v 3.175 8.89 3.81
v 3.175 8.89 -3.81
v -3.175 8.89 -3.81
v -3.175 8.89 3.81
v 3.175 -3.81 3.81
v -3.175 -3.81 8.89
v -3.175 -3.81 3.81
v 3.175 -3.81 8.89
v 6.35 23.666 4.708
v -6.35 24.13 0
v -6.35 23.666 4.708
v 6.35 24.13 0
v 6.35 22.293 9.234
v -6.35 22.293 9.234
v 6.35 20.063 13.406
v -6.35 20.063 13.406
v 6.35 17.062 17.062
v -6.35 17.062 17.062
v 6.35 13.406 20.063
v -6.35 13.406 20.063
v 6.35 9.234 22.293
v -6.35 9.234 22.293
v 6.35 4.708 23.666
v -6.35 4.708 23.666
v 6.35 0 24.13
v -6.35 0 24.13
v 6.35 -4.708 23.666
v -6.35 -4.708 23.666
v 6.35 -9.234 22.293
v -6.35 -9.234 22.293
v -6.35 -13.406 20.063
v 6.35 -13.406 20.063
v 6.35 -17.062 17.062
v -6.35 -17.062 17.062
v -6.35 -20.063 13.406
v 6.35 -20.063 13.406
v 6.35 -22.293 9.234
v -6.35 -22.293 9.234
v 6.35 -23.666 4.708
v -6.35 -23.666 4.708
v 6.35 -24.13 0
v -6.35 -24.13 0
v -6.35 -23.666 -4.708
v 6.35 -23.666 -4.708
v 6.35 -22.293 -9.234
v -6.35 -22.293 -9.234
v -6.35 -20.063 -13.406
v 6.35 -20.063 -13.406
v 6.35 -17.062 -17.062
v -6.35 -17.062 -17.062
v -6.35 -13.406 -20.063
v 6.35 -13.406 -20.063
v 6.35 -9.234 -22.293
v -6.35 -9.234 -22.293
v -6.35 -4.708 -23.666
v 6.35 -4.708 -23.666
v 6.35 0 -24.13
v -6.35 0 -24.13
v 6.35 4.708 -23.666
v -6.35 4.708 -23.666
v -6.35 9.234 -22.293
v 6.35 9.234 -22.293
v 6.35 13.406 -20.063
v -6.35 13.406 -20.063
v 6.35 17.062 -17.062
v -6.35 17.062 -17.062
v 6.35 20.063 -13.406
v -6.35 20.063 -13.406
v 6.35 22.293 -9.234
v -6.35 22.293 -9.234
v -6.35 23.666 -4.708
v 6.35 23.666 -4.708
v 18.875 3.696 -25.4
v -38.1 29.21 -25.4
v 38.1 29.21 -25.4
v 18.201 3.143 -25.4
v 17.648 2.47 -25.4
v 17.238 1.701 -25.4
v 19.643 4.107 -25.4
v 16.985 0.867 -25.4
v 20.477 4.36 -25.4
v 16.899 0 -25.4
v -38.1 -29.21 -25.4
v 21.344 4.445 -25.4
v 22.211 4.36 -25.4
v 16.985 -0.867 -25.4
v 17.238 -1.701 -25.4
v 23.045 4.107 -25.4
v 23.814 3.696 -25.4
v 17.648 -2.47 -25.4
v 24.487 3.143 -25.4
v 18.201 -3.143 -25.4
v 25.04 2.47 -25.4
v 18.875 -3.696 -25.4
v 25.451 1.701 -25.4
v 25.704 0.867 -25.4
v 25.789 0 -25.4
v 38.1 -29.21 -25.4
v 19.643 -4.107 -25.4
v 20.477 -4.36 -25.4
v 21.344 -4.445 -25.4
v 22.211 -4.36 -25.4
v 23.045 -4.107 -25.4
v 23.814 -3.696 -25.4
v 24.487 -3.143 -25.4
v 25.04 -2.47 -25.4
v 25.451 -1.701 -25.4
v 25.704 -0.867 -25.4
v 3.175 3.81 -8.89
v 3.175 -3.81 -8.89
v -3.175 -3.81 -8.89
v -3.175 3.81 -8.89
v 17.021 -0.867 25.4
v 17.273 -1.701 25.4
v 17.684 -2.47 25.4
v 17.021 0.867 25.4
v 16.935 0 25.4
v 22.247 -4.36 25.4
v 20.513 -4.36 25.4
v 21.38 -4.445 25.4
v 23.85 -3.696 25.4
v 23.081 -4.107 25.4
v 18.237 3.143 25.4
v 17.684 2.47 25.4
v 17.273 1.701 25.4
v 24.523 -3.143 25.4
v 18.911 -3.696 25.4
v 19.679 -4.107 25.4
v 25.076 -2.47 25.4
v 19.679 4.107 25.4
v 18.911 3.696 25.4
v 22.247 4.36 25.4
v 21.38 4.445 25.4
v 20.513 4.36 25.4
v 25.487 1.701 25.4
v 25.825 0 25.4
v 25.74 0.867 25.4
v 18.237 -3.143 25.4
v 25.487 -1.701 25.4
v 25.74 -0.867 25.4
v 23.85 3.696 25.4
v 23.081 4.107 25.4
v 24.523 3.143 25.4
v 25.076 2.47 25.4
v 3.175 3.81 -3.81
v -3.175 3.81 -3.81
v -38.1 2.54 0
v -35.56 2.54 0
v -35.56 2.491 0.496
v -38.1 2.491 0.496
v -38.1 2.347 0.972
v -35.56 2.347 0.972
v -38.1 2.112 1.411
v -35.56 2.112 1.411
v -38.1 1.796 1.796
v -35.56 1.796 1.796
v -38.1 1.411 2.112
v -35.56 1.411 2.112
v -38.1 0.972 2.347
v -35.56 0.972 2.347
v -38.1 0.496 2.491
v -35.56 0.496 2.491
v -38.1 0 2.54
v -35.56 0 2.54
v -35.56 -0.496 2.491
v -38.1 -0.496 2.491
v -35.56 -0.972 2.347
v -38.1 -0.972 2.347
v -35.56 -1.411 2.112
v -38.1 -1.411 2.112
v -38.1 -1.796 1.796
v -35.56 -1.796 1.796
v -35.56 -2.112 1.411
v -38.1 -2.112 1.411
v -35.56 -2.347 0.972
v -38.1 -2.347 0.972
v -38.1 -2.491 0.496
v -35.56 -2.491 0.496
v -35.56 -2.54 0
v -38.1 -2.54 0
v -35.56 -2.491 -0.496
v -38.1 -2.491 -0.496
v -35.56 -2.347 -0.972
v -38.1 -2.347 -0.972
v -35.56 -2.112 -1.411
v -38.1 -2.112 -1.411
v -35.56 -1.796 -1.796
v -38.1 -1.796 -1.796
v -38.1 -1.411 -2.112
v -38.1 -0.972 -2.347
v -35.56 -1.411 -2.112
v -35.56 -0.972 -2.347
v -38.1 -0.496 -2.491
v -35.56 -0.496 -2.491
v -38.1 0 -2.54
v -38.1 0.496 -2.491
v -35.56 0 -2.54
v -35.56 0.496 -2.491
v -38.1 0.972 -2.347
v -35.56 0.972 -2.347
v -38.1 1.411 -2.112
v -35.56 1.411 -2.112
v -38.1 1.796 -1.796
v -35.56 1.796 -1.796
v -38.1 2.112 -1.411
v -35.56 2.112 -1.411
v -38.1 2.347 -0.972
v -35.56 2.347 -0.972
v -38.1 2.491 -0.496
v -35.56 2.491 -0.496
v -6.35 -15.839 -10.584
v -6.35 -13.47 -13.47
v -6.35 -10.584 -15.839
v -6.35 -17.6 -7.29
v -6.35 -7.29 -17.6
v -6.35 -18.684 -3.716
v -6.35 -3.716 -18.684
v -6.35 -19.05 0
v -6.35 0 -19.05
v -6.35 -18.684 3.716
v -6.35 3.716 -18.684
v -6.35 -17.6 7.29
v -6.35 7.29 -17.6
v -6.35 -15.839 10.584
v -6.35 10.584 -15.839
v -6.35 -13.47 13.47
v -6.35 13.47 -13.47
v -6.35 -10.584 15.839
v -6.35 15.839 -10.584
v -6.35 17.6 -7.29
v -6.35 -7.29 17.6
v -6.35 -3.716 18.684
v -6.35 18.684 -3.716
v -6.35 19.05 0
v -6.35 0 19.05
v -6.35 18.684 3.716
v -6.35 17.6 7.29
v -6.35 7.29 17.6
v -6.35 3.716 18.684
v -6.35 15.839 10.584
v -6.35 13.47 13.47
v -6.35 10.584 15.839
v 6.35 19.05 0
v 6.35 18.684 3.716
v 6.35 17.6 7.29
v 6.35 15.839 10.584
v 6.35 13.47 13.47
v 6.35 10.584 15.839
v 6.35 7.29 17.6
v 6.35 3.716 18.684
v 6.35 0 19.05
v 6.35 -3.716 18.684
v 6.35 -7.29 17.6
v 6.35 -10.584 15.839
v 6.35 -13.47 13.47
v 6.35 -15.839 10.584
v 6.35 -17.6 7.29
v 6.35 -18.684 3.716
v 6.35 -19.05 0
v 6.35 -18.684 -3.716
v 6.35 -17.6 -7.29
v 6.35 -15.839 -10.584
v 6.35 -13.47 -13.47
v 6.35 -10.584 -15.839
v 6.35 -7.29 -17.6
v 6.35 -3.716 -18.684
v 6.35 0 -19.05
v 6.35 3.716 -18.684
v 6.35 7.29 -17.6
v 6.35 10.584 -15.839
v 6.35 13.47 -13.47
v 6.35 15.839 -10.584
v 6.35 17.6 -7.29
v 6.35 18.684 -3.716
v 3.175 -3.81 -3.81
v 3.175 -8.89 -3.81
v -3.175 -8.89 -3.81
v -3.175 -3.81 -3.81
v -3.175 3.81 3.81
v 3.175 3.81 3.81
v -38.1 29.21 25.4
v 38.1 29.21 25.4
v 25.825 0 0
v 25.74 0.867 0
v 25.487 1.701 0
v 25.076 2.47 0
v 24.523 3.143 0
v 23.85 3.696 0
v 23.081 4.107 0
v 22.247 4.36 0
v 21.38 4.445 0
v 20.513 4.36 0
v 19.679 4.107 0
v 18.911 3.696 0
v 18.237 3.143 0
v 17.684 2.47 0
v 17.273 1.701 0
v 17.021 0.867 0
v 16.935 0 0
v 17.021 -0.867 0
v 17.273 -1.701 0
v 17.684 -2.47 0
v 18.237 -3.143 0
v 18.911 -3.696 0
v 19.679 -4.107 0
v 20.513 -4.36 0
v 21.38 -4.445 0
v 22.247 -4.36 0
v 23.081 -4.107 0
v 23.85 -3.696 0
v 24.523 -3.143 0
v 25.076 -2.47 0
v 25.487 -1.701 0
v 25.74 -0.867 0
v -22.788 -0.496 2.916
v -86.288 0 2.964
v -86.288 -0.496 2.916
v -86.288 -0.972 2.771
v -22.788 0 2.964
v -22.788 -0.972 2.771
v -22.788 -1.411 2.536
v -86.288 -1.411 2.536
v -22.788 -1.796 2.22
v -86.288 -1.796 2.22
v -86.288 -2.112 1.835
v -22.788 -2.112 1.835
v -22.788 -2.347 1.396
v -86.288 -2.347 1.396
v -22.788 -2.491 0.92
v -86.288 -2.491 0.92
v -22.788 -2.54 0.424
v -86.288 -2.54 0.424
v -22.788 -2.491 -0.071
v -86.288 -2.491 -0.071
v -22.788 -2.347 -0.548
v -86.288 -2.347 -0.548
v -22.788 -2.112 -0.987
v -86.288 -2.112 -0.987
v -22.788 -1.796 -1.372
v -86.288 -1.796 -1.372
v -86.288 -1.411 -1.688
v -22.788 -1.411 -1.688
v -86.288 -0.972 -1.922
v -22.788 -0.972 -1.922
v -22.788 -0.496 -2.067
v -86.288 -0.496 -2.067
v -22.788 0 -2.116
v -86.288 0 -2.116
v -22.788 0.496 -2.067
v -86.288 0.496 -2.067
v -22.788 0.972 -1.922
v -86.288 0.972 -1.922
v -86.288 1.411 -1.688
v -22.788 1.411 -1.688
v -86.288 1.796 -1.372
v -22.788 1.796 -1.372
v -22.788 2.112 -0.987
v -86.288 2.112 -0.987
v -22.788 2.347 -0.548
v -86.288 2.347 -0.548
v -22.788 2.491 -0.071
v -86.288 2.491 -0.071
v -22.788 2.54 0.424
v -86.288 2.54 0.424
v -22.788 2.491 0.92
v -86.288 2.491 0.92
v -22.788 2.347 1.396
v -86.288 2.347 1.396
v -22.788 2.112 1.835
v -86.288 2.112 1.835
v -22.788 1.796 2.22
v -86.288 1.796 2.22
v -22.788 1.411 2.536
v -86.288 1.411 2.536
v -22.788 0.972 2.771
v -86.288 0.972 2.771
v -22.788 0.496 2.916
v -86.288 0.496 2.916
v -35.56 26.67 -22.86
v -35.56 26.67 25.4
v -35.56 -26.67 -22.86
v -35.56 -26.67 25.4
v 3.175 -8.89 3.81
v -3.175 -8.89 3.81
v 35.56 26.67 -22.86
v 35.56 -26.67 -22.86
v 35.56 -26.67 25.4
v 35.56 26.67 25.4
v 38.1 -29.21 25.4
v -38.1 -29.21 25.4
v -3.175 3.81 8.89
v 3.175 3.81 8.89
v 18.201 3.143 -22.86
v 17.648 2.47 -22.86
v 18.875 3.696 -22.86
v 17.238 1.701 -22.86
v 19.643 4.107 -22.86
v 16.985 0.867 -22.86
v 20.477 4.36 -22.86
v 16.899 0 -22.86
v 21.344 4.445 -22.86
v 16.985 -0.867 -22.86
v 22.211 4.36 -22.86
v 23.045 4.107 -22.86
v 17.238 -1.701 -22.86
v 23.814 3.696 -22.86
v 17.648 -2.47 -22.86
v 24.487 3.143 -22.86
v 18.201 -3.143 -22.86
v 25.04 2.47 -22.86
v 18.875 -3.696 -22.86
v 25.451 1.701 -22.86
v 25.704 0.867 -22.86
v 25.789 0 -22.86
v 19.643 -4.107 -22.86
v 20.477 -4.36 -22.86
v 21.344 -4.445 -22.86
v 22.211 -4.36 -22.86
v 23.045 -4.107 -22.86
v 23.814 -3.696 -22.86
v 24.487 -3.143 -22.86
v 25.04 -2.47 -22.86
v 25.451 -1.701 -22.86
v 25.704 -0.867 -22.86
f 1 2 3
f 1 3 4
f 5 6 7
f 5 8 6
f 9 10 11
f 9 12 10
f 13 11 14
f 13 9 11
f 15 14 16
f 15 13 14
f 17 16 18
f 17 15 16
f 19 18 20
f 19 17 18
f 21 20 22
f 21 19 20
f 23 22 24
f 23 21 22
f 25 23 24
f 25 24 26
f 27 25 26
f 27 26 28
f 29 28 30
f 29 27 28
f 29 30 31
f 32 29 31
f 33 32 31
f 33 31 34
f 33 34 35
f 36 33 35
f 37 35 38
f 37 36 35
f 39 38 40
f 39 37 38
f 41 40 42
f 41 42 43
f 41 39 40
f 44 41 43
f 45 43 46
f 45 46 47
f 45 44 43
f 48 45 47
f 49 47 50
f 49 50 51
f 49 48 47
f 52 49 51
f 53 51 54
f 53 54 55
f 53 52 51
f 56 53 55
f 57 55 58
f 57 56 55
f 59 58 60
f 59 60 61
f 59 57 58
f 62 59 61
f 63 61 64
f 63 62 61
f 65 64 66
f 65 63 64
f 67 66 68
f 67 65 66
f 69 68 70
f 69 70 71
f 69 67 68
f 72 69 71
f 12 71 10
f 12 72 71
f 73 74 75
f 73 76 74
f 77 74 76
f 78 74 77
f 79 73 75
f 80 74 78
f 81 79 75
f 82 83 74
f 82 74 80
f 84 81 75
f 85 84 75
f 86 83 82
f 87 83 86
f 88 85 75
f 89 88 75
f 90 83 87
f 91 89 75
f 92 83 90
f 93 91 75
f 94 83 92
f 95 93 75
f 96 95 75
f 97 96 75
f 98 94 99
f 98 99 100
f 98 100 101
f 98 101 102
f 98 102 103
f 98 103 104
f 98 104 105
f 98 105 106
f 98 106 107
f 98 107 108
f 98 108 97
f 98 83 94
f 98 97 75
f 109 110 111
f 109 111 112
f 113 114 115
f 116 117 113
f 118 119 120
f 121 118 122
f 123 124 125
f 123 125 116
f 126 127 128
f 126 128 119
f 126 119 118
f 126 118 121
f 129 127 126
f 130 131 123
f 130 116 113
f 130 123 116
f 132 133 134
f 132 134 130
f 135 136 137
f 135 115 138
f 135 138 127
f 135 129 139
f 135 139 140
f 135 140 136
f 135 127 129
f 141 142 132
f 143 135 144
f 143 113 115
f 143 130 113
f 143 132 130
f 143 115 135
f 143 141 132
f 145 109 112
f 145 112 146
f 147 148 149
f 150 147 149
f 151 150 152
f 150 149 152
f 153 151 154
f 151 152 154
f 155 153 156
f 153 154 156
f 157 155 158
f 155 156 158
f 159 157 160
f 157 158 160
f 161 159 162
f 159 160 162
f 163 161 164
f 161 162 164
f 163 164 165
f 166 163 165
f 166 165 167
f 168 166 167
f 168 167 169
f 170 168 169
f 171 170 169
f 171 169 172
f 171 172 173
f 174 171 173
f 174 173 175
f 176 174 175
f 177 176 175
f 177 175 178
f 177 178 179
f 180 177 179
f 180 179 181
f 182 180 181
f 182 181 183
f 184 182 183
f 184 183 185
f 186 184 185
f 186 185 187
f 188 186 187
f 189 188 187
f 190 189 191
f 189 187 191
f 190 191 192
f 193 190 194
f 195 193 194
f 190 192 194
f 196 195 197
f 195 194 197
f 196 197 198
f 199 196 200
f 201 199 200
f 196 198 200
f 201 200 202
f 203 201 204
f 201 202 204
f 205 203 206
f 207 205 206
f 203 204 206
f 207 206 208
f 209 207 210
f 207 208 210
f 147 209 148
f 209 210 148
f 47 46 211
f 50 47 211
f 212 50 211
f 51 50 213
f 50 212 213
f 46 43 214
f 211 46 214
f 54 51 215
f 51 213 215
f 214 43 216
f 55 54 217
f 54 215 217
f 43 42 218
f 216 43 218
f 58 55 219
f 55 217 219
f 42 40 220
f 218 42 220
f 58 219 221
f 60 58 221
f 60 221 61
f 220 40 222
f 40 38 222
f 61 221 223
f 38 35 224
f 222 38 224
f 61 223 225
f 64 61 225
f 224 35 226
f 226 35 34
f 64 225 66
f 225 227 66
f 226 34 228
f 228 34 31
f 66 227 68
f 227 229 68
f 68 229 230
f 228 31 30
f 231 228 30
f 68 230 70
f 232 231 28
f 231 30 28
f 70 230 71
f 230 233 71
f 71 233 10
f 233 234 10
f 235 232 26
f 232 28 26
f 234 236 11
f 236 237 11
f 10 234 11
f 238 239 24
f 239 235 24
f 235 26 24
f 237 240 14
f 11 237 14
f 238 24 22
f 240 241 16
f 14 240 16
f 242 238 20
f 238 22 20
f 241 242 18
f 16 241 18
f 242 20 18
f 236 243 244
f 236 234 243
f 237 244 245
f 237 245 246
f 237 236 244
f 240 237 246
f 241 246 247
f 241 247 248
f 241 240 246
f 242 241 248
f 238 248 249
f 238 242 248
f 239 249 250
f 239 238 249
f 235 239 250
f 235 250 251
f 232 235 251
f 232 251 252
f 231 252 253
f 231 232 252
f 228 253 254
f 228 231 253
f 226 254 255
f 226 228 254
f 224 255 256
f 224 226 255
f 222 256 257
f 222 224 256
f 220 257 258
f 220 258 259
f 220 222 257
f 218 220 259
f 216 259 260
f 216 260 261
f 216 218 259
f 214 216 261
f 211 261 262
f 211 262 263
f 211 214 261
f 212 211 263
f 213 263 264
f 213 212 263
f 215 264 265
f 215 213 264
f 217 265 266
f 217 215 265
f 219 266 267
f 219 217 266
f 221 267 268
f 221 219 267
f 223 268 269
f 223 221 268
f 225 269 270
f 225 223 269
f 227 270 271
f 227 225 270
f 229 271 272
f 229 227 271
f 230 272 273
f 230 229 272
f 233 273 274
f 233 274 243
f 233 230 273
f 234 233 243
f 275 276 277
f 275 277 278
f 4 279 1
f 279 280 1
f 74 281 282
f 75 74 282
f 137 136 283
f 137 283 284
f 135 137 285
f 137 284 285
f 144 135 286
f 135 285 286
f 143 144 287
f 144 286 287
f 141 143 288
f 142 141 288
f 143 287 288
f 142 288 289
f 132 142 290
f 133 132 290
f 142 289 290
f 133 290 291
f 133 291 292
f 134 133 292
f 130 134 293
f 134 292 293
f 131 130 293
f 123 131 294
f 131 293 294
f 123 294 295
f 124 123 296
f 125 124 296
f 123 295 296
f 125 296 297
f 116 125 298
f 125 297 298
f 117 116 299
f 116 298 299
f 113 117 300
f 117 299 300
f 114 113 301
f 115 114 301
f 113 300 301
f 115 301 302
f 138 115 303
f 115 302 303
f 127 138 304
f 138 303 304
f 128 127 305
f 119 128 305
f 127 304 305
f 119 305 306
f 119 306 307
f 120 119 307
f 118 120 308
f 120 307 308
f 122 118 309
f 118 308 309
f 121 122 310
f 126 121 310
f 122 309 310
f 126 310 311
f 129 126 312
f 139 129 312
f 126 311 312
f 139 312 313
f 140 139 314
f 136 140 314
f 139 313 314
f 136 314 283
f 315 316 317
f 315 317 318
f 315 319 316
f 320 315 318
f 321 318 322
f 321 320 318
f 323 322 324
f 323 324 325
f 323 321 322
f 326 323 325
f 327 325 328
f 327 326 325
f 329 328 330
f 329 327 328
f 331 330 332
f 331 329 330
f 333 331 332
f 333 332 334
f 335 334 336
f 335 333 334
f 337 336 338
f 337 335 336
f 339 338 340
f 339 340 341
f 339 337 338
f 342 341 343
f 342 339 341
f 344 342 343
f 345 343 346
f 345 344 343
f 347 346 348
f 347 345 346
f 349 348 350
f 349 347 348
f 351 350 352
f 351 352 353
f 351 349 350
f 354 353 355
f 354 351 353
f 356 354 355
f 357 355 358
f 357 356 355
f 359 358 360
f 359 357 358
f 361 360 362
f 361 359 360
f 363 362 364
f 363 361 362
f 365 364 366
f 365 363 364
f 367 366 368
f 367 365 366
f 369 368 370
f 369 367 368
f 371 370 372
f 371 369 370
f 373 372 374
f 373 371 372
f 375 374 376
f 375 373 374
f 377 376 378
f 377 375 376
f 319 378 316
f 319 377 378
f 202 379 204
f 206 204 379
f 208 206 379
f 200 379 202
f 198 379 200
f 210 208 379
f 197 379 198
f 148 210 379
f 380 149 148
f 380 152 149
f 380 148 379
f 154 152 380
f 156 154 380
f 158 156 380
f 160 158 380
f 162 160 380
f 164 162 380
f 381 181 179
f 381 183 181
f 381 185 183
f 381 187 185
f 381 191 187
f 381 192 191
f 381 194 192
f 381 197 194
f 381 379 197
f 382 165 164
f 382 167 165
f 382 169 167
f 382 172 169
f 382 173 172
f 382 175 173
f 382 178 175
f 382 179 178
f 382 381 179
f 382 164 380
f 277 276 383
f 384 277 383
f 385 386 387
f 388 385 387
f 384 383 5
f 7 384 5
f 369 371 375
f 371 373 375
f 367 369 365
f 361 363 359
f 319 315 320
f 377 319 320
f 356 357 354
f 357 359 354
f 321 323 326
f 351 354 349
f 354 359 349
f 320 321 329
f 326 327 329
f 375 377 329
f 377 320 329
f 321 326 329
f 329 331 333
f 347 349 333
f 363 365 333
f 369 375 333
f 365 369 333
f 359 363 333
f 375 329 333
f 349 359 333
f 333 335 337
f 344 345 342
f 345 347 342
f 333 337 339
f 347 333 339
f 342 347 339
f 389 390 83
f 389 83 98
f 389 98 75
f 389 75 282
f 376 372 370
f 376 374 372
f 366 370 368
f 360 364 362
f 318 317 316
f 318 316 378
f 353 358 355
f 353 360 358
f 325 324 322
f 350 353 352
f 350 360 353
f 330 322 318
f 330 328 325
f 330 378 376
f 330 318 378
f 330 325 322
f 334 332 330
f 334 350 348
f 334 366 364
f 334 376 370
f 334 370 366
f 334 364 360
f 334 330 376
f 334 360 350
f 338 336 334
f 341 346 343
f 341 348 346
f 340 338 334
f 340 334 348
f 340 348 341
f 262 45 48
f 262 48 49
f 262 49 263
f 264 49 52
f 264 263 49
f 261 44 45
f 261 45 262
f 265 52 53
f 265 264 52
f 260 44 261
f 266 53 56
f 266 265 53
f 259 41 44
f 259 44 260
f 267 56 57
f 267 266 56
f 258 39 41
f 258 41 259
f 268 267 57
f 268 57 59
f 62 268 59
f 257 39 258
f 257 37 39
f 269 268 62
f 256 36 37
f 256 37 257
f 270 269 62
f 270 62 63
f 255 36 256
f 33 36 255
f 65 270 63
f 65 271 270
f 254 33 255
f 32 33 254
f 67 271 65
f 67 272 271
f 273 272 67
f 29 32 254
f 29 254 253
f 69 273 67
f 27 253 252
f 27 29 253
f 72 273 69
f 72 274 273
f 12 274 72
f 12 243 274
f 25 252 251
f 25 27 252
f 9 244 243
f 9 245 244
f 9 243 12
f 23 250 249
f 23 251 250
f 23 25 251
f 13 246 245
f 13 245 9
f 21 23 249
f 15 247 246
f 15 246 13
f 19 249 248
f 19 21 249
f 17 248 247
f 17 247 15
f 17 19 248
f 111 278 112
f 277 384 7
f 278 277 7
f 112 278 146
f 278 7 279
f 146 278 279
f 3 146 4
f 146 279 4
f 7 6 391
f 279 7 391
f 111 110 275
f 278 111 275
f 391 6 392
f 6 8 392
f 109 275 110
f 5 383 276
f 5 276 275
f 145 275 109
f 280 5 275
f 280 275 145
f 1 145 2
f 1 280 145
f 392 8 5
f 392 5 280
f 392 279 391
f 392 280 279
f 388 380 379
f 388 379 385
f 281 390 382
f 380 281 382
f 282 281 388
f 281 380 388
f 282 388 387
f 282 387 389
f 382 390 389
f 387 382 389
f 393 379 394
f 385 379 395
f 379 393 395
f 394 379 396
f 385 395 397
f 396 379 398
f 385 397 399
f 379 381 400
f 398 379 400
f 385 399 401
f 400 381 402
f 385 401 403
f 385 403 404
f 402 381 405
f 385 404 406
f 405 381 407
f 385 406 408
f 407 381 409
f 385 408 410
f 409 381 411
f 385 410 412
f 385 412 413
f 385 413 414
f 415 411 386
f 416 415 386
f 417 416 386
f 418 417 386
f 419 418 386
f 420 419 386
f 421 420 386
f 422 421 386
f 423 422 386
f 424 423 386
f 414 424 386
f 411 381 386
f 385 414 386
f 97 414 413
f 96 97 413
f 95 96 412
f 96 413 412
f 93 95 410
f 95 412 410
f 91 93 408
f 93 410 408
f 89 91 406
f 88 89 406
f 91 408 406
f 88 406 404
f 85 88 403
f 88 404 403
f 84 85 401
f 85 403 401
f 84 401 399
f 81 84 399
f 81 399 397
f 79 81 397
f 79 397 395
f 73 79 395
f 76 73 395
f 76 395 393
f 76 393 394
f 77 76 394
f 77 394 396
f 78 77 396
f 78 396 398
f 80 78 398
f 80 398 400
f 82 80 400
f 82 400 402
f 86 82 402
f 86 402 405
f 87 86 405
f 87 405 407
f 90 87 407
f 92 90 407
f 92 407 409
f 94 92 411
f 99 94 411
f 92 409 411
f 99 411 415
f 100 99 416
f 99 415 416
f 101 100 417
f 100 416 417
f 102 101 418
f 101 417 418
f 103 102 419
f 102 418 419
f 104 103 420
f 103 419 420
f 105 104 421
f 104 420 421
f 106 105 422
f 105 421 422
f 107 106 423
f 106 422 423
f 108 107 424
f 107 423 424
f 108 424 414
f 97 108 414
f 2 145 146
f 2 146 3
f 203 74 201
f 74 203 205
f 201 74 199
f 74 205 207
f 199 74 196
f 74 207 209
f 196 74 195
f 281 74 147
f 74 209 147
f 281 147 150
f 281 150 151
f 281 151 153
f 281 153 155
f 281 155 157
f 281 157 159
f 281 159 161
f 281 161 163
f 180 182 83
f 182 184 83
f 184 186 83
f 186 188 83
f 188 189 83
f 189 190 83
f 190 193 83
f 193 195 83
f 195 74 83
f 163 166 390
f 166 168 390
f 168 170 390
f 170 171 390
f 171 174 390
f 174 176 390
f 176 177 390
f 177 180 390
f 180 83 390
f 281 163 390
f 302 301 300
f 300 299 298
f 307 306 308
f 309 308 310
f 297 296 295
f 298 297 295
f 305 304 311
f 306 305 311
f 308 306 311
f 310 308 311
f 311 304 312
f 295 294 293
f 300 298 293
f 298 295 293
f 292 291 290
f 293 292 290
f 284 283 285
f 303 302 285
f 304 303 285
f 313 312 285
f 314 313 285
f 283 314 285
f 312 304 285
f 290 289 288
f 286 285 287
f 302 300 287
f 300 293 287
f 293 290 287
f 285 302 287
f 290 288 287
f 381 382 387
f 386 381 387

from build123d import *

# Parameters (mm, degrees)
F0_W      = 76.2
F0_H      = 50.8
F1_DEPTH  = 29.21
F2_T      = -2.54
F3_R      = 2.54
F4_DEPTH  = 38.101
F5_W      = 63.5
F5_H      = 2.54
F7_W      = 7.62
F7_H      = 5.08
F7_H_2    = 7.62
F7_W_2    = 5.08
F8_DEPTH  = 3.175
F9_R      = 24.13
F9_R_2    = 19.05
F10_DEPTH = 6.35
F11_R     = 4.445
F12_DEPTH = 41.656
F13_R     = 4.445
F14_DEPTH = 25.4


with BuildPart() as f1:
    # F0 (on Front) → F1 (new body, symmetric)
    with BuildSketch(Plane.XZ):
        Rectangle(F0_W, F0_H)
    extrude(amount=F1_DEPTH, both=True)

    # F2
    f2_openings = [f1.faces().sort_by_distance(p)[0] for p in [
        (0, 0, 25.4),
    ]]
    offset(amount=F2_T, openings=f2_openings)

    # F3 (on Right) → F4 (cut, through all)
    with BuildSketch(Plane.YZ):
        Circle(F3_R)
    extrude(amount=-F4_DEPTH, mode=Mode.SUBTRACT)

    # F11 (on Top) → F12 (cut)
    with BuildSketch(Plane.XY):
        with Locations((21.3442667981, 0)):
            Circle(F11_R)
    extrude(amount=-F12_DEPTH, mode=Mode.SUBTRACT)


with BuildPart() as f6:
    # F5 (on Front) → F6 (revolve)
    with BuildSketch(Plane.XZ):
        with Locations((-54.5376882462, 1.6943329167)):
            Rectangle(F5_W, F5_H)
    revolve(axis=Axis((-61.0382007435, 0, 0.4243329167), (1, 0, 0)))


with BuildPart() as f8:
    # F7 (on Right) → F8 (new body, symmetric)
    with BuildSketch(Plane.YZ):
        with Locations((0, 6.35)):
            Rectangle(F7_W, F7_H)
        Rectangle(F7_W, F7_H_2)
        with Locations((-6.35, 0)):
            Rectangle(F7_W_2, F7_H_2)
        with Locations((6.35, 0)):
            Rectangle(F7_W_2, F7_H_2)
        with Locations((0, -6.35)):
            Rectangle(F7_W, F7_H)
    extrude(amount=F8_DEPTH, both=True)


with BuildPart() as f10:
    # F9 (on Right) → F10 (new body, symmetric)
    with BuildSketch(Plane.YZ):
        Circle(F9_R)
        Circle(F9_R_2, mode=Mode.SUBTRACT)
    extrude(amount=F10_DEPTH, both=True)


with BuildPart() as f14:
    # F13 (on Top) → F14 (new body)
    with BuildSketch(Plane.XY):
        with Locations((21.3801246136, 0)):
            Circle(F13_R)
    extrude(amount=F14_DEPTH)


solid = Compound([f1.part, f6.part, f8.part, f10.part, f14.part])
